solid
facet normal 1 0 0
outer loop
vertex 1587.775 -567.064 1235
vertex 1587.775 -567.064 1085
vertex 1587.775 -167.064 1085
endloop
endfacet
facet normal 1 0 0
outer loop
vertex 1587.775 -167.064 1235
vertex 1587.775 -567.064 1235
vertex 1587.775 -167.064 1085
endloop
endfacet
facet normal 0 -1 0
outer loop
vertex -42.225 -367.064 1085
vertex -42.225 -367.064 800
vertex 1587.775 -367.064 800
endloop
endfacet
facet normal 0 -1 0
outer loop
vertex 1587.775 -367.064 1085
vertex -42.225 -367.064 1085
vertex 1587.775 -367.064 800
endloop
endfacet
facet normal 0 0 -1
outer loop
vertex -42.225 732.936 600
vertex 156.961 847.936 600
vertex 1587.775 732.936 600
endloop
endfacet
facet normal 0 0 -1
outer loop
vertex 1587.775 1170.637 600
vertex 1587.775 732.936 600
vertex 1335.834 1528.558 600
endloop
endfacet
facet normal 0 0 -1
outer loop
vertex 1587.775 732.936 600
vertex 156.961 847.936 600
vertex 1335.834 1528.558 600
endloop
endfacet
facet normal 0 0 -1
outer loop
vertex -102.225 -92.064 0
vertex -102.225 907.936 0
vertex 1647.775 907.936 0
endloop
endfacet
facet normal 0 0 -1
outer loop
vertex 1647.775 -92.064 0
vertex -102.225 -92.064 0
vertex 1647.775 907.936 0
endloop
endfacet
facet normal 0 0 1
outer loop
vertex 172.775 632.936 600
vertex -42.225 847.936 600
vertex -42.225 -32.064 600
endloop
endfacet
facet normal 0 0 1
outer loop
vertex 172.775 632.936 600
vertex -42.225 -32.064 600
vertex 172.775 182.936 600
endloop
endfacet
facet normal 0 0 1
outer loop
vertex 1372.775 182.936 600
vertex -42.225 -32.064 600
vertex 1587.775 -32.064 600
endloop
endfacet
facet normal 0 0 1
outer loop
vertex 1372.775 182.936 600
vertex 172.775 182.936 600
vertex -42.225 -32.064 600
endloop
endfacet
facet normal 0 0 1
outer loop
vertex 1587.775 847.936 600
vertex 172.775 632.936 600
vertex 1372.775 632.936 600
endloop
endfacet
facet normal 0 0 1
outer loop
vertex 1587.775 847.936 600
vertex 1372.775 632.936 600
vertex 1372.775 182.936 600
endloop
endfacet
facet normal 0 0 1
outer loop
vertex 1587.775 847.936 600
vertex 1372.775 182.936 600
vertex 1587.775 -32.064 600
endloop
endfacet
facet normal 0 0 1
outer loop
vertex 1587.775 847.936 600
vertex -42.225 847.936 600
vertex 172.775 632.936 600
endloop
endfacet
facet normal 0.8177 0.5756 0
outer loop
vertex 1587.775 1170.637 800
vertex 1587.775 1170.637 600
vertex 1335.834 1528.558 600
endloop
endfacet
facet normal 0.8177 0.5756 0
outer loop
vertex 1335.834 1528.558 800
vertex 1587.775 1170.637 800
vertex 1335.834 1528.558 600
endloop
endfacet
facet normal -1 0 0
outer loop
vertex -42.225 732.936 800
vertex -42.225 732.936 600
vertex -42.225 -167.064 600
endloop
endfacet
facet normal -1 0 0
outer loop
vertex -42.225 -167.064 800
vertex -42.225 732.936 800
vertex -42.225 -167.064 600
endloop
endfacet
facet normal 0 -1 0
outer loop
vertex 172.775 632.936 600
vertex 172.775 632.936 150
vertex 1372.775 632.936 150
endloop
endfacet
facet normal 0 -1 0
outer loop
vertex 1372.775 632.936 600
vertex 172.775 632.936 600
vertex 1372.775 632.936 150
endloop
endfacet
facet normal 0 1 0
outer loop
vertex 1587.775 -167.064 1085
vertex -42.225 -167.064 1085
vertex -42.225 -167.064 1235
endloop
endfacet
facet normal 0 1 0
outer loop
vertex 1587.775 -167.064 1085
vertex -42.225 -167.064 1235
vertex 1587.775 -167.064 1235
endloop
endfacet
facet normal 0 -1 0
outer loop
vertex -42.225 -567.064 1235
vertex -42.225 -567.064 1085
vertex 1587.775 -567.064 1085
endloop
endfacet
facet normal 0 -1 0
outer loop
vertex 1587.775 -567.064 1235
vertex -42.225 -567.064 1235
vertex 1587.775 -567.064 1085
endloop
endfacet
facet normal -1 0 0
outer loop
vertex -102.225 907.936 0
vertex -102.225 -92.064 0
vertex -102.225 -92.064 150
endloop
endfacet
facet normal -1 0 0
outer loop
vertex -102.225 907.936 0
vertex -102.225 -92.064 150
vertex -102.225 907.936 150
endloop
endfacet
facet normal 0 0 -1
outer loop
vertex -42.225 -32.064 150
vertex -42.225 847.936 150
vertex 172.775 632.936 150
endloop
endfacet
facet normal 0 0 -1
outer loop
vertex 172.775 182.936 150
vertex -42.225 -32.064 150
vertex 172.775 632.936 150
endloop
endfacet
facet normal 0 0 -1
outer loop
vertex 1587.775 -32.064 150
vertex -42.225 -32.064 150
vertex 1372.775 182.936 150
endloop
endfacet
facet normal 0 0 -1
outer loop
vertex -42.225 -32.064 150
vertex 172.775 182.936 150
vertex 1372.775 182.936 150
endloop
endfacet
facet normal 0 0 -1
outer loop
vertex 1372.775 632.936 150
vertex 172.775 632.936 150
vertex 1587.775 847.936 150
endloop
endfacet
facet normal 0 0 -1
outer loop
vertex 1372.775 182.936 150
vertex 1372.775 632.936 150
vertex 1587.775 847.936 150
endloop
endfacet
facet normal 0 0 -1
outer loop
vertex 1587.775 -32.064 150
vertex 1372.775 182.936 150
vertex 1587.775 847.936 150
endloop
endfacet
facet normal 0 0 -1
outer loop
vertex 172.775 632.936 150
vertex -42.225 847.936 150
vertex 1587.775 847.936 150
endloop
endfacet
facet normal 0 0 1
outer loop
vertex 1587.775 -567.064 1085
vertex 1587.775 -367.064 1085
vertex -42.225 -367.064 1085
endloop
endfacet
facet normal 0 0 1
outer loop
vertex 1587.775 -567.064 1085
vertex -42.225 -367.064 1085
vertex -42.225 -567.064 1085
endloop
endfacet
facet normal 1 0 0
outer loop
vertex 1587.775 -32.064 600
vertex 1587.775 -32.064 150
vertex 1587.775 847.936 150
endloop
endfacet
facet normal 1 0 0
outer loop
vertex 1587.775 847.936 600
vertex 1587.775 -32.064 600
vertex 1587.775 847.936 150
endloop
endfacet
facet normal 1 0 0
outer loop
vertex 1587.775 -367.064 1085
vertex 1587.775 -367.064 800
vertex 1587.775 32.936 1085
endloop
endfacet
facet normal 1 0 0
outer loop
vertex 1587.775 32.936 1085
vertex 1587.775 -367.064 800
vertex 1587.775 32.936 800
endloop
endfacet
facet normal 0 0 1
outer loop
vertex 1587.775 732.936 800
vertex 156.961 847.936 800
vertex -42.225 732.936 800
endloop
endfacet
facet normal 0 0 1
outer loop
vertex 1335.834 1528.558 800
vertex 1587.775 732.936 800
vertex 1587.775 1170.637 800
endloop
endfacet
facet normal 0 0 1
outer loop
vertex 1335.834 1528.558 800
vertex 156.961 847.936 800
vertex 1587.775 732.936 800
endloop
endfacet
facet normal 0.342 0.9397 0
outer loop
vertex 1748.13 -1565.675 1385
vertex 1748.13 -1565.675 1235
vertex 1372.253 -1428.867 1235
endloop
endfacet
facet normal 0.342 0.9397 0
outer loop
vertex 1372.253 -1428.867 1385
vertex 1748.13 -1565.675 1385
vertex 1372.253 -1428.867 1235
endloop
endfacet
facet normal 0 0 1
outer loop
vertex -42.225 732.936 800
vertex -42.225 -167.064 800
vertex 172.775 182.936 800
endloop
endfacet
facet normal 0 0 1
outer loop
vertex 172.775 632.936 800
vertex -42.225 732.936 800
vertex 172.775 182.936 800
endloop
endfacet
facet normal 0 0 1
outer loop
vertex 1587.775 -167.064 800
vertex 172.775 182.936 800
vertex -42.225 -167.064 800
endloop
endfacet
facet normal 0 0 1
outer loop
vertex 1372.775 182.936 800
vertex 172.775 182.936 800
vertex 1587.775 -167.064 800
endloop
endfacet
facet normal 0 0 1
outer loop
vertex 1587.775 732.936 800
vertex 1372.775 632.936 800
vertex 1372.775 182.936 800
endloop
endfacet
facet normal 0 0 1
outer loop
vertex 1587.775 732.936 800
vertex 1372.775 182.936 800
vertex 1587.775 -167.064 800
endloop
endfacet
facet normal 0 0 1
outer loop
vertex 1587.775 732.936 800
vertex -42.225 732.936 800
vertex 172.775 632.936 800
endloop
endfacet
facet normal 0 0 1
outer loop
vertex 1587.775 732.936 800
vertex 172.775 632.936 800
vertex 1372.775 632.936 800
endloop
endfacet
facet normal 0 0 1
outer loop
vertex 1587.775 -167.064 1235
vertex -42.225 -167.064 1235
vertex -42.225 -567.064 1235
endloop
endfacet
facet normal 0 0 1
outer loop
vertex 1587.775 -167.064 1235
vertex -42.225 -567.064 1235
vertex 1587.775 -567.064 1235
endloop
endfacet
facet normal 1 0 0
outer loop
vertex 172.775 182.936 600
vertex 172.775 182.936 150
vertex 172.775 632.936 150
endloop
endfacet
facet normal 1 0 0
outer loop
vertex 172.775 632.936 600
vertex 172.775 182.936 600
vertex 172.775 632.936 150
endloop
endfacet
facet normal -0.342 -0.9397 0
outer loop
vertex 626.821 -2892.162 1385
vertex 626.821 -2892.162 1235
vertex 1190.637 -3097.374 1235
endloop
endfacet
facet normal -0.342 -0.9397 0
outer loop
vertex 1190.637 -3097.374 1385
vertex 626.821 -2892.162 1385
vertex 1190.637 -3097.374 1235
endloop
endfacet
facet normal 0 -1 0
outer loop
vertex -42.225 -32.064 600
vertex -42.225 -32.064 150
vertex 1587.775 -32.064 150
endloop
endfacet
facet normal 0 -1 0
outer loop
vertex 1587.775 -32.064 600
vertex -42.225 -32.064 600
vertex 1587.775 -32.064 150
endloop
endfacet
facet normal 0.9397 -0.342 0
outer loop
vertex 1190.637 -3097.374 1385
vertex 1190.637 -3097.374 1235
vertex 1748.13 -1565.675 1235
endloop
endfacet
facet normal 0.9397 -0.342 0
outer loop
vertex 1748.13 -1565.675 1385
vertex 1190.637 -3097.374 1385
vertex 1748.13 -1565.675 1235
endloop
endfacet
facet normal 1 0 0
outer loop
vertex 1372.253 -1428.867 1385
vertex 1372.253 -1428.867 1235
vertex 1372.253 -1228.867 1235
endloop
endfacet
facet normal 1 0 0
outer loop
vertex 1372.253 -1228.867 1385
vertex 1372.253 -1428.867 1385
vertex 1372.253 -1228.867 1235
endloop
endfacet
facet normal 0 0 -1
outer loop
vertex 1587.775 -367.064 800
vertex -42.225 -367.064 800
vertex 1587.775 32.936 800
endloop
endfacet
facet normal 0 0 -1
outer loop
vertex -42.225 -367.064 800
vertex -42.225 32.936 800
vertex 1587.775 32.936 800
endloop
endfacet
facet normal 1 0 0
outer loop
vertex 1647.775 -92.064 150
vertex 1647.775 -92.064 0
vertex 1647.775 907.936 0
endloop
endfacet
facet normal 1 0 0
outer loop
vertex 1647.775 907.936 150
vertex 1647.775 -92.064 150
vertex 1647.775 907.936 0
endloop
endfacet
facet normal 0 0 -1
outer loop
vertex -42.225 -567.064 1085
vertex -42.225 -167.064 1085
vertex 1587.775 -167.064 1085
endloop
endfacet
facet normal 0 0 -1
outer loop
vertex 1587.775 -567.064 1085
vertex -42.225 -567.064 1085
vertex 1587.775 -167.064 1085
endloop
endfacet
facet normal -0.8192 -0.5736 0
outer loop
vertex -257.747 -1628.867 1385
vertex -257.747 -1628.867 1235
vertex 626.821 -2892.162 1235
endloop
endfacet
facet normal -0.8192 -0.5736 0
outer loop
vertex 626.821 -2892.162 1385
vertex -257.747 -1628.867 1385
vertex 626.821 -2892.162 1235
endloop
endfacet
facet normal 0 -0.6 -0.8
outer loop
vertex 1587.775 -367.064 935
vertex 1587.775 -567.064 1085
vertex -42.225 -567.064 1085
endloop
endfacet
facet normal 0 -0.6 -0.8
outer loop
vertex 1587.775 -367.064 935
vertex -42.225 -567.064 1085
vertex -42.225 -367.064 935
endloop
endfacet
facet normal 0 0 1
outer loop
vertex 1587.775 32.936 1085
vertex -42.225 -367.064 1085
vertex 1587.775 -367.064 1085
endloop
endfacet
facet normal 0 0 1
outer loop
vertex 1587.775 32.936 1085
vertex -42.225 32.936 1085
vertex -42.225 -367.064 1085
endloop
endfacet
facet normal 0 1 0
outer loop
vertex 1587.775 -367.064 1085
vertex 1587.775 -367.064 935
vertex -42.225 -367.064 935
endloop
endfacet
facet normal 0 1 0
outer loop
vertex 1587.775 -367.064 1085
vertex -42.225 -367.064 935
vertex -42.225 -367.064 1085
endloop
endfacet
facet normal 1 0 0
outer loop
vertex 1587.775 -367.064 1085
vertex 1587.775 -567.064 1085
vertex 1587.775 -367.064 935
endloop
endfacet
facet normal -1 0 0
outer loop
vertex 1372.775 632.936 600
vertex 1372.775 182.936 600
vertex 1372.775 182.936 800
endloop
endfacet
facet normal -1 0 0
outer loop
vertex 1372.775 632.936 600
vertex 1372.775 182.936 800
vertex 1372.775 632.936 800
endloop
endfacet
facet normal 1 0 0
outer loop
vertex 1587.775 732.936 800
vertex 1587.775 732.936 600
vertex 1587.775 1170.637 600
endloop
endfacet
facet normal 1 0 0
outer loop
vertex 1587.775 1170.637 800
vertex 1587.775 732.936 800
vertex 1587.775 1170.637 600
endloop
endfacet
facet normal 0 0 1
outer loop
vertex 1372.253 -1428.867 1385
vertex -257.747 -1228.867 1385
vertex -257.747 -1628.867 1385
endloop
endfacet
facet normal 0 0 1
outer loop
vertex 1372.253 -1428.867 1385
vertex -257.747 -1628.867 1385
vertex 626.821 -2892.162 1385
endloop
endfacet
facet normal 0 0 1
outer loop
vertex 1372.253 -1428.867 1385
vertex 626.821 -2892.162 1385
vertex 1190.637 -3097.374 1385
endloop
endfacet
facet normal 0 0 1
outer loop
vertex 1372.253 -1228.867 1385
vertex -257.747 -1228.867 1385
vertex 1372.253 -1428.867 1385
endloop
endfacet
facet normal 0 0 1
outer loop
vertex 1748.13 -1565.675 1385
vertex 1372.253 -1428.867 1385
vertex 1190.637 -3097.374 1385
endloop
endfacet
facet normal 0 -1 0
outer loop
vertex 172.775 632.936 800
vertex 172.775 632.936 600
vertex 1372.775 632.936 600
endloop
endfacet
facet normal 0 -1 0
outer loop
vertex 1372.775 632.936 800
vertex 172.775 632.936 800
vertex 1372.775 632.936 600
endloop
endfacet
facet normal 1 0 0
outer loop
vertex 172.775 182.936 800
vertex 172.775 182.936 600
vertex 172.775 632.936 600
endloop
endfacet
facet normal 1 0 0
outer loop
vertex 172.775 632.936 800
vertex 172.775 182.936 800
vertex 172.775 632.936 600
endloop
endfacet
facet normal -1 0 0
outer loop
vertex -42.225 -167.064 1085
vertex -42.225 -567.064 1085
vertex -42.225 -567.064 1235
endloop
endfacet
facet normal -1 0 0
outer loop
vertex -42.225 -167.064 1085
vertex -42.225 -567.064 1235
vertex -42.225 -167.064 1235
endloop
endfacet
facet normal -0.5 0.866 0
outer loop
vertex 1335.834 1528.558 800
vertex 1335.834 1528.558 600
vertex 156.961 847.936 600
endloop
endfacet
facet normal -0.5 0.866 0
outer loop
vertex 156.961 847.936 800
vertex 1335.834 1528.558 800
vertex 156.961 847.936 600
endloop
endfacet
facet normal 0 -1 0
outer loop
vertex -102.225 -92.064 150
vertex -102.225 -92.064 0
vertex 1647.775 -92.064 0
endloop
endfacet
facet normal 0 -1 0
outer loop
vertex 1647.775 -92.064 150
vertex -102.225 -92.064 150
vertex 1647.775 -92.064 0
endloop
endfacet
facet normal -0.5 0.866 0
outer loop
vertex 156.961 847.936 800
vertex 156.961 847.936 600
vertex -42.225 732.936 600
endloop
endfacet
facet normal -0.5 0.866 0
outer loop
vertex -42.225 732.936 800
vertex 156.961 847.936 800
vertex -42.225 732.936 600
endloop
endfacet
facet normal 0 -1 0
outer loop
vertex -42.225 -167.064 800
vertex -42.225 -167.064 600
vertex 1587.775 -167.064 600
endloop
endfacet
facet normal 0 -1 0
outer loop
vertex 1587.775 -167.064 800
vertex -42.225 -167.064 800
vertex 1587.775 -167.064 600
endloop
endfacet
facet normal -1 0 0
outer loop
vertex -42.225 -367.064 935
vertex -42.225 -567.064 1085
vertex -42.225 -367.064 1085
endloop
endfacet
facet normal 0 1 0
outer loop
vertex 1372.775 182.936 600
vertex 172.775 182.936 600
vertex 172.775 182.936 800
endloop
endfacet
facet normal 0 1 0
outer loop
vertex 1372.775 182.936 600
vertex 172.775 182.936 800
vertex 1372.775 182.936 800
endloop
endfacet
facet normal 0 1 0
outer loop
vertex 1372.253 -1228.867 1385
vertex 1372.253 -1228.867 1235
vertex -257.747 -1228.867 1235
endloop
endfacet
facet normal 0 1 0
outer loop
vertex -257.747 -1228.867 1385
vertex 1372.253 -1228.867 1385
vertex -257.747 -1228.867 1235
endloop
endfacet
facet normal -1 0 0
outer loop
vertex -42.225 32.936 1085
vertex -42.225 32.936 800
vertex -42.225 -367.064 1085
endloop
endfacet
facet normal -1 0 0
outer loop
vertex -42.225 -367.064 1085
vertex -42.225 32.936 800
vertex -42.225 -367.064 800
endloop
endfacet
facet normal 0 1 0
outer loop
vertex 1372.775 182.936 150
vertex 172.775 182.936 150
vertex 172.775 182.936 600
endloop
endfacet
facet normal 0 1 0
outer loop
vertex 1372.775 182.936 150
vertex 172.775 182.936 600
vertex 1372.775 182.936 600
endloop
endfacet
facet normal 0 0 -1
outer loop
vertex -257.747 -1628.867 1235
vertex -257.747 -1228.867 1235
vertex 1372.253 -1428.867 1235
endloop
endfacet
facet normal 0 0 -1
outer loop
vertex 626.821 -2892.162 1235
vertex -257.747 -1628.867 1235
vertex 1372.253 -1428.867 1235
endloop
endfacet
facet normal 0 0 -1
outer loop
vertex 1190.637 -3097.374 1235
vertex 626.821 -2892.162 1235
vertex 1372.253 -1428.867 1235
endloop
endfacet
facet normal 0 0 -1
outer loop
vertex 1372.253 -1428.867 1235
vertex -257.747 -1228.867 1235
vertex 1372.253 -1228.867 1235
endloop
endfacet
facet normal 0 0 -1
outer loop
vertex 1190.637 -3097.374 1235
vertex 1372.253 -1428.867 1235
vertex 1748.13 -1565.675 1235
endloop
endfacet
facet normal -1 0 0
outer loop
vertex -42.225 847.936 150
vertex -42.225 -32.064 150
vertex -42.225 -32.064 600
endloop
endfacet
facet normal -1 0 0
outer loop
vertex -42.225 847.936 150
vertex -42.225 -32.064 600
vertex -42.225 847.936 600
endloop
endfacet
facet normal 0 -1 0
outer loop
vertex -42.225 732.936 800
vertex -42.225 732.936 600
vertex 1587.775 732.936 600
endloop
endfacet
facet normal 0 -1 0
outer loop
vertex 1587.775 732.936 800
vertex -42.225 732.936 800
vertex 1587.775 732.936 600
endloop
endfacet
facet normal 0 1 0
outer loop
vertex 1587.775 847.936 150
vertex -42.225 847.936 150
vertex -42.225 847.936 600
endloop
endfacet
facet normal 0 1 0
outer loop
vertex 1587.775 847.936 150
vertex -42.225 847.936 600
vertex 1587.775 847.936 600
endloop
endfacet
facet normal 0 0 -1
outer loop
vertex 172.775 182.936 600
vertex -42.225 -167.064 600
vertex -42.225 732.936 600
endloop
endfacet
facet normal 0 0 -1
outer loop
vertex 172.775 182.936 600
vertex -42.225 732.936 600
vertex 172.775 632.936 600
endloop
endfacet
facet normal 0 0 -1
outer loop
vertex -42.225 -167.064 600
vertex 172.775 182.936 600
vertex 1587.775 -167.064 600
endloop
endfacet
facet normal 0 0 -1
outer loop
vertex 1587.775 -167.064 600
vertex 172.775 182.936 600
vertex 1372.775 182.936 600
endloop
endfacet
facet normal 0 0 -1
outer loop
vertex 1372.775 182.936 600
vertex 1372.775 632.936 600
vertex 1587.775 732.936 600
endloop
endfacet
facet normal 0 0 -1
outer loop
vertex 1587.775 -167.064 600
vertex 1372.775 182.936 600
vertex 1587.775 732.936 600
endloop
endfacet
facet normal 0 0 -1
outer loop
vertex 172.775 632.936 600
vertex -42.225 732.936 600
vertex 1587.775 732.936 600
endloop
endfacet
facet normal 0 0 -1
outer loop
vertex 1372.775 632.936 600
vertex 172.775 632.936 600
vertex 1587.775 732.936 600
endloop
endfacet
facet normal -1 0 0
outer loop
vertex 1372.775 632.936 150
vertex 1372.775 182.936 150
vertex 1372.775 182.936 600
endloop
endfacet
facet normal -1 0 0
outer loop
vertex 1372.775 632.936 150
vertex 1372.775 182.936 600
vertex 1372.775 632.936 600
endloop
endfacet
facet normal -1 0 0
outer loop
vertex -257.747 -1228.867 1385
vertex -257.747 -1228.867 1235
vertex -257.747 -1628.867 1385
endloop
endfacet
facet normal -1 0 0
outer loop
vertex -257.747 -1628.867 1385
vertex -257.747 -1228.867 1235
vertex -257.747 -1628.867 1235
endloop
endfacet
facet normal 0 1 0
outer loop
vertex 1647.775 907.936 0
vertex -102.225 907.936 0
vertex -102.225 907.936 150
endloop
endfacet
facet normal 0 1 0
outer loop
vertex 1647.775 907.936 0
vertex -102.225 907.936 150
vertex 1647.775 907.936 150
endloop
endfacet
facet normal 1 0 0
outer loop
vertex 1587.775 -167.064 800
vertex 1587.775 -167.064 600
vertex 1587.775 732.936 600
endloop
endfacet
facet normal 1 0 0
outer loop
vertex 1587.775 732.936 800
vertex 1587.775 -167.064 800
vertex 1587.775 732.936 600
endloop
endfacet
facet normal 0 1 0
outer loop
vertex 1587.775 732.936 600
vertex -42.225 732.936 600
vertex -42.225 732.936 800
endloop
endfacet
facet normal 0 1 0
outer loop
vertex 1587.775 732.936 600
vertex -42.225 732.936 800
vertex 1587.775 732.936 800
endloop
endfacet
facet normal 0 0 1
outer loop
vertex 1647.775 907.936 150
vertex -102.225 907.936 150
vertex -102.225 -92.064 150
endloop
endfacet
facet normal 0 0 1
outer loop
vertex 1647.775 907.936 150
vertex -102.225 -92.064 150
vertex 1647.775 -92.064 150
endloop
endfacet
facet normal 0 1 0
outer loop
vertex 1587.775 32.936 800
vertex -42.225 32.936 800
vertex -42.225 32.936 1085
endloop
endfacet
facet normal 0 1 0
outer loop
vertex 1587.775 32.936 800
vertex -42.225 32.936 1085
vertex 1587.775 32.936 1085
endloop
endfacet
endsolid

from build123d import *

# Parameters (mm, degrees)
F0_W      = 1750
F0_H      = 1000
F1_DEPTH  = 150
F2_W      = 1630
F2_H      = 880
F2_W_2    = 1200
F2_H_2    = 450
F3_DEPTH  = 450
F4_W      = 1630
F4_H      = 135
F4_H_2    = 765
F4_W_2    = 1200
F4_H_3    = 450
F5_DEPTH  = 200
F6_W      = 1630
F6_H      = 200
F7_DEPTH  = 285
F8_W      = 1630
F8_H      = 400
F9_DEPTH  = 150
F11_DEPTH = 1630
F13_DEPTH = 150
F14_W     = 1615
F14_H     = 3045
F15_DEPTH = 150
F19_DEPTH = 200
F21_DEPTH = 150


with BuildPart() as f1:
    # F0 (on Top) → F1 (new body)
    with BuildSketch(Plane.XY):
        with Locations((772.775441, 407.935686)):
            Rectangle(F0_W, F0_H)
    extrude(amount=F1_DEPTH)


with BuildPart() as f3:
    # F2 (on face) → F3 (new body)
    with BuildSketch(Plane.XY.offset(150)):
        with Locations((772.775441, 407.935686)):
            Rectangle(F2_W, F2_H)
        with Locations((772.775441, 407.935686)):
            Rectangle(F2_W_2, F2_H_2, mode=Mode.SUBTRACT)
    extrude(amount=F3_DEPTH)


with BuildPart() as f5:
    # F4 (on face) → F5 (new body)
    with BuildSketch(Plane.XY.offset(600)):
        with Locations((772.775441, -99.564314)):
            Rectangle(F4_W, F4_H)
        with Locations((772.775441, 350.435686)):
            Rectangle(F4_W, F4_H_2)
        with Locations((772.775441, 407.935686)):
            Rectangle(F4_W_2, F4_H_3, mode=Mode.SUBTRACT)
    extrude(amount=F5_DEPTH)


with BuildPart() as f7:
    # F6 (on face) → F7 (new body)
    with BuildSketch(Plane.XY.offset(800)):
        with Locations((772.775441, -267.064314)):
            Rectangle(F6_W, F6_H)
        with Locations((772.775441, -67.064314)):
            Rectangle(F6_W, F6_H)
    extrude(amount=F7_DEPTH)


with BuildPart() as f9:
    # F8 (on face) → F9 (new body)
    with BuildSketch(Plane.XY.offset(1085)):
        with Locations((772.775441, -367.064314)):
            Rectangle(F8_W, F8_H)
    extrude(amount=F9_DEPTH)


with BuildPart() as f11:
    # F10 (on face) → F11 (new body)
    with BuildSketch(Plane.YZ.offset(1587.775441)):
        Polygon((-367.064314, 935), (-367.064314, 1085), (-567.064314, 1085), align=None)
    extrude(amount=-F11_DEPTH)


with BuildPart() as f13:
    # F12 (on face) → F13 (new body)
    with BuildSketch(Plane.XY.offset(1235)):
        Polygon((1759.989725, -1001.661468), (129.989725, -1001.661468), (129.989725, -1201.661468), (-70.010275, -1201.661468), (-70.010275, -2831.661468), (1759.989725, -2831.661468), align=None)
    extrude(amount=F13_DEPTH)


with BuildPart() as f15:
    # F14 (on face) → F15 (new body)
    with BuildSketch(Plane.XY.offset(1385)):
        with Locations((-1271.28089, -3268.740692)):
            Rectangle(F14_W, F14_H)
    extrude(amount=F15_DEPTH)


with BuildPart() as f19:
    # F18 (on face) → F19 (new body)
    with BuildSketch(Plane.XY.offset(600)):
        Polygon((156.961284, 847.935686), (1587.775441, 847.935686), (1587.775441, 1170.63677), (1335.833747, 1528.55802), align=None)
        Polygon((-42.224559, 732.935686), (1587.775441, 732.935686), (1587.775441, 847.935686), (156.961284, 847.935686), align=None)
    extrude(amount=F19_DEPTH)


with BuildPart() as f21:
    # F20 (on face) → F21 (new body)
    with BuildSketch(Plane.XY.offset(1235)):
        Polygon((1372.252827, -1428.867269), (1372.252827, -1228.867269), (-257.747173, -1228.867269), (-257.747173, -1628.867269), (626.821469, -2892.162212), (1190.637041, -3097.374298), (1748.129875, -1565.675326), align=None)
    extrude(amount=F21_DEPTH)


solid = Compound([f1.part, f3.part, f5.part, f7.part, f9.part, f11.part, f19.part, f21.part])
